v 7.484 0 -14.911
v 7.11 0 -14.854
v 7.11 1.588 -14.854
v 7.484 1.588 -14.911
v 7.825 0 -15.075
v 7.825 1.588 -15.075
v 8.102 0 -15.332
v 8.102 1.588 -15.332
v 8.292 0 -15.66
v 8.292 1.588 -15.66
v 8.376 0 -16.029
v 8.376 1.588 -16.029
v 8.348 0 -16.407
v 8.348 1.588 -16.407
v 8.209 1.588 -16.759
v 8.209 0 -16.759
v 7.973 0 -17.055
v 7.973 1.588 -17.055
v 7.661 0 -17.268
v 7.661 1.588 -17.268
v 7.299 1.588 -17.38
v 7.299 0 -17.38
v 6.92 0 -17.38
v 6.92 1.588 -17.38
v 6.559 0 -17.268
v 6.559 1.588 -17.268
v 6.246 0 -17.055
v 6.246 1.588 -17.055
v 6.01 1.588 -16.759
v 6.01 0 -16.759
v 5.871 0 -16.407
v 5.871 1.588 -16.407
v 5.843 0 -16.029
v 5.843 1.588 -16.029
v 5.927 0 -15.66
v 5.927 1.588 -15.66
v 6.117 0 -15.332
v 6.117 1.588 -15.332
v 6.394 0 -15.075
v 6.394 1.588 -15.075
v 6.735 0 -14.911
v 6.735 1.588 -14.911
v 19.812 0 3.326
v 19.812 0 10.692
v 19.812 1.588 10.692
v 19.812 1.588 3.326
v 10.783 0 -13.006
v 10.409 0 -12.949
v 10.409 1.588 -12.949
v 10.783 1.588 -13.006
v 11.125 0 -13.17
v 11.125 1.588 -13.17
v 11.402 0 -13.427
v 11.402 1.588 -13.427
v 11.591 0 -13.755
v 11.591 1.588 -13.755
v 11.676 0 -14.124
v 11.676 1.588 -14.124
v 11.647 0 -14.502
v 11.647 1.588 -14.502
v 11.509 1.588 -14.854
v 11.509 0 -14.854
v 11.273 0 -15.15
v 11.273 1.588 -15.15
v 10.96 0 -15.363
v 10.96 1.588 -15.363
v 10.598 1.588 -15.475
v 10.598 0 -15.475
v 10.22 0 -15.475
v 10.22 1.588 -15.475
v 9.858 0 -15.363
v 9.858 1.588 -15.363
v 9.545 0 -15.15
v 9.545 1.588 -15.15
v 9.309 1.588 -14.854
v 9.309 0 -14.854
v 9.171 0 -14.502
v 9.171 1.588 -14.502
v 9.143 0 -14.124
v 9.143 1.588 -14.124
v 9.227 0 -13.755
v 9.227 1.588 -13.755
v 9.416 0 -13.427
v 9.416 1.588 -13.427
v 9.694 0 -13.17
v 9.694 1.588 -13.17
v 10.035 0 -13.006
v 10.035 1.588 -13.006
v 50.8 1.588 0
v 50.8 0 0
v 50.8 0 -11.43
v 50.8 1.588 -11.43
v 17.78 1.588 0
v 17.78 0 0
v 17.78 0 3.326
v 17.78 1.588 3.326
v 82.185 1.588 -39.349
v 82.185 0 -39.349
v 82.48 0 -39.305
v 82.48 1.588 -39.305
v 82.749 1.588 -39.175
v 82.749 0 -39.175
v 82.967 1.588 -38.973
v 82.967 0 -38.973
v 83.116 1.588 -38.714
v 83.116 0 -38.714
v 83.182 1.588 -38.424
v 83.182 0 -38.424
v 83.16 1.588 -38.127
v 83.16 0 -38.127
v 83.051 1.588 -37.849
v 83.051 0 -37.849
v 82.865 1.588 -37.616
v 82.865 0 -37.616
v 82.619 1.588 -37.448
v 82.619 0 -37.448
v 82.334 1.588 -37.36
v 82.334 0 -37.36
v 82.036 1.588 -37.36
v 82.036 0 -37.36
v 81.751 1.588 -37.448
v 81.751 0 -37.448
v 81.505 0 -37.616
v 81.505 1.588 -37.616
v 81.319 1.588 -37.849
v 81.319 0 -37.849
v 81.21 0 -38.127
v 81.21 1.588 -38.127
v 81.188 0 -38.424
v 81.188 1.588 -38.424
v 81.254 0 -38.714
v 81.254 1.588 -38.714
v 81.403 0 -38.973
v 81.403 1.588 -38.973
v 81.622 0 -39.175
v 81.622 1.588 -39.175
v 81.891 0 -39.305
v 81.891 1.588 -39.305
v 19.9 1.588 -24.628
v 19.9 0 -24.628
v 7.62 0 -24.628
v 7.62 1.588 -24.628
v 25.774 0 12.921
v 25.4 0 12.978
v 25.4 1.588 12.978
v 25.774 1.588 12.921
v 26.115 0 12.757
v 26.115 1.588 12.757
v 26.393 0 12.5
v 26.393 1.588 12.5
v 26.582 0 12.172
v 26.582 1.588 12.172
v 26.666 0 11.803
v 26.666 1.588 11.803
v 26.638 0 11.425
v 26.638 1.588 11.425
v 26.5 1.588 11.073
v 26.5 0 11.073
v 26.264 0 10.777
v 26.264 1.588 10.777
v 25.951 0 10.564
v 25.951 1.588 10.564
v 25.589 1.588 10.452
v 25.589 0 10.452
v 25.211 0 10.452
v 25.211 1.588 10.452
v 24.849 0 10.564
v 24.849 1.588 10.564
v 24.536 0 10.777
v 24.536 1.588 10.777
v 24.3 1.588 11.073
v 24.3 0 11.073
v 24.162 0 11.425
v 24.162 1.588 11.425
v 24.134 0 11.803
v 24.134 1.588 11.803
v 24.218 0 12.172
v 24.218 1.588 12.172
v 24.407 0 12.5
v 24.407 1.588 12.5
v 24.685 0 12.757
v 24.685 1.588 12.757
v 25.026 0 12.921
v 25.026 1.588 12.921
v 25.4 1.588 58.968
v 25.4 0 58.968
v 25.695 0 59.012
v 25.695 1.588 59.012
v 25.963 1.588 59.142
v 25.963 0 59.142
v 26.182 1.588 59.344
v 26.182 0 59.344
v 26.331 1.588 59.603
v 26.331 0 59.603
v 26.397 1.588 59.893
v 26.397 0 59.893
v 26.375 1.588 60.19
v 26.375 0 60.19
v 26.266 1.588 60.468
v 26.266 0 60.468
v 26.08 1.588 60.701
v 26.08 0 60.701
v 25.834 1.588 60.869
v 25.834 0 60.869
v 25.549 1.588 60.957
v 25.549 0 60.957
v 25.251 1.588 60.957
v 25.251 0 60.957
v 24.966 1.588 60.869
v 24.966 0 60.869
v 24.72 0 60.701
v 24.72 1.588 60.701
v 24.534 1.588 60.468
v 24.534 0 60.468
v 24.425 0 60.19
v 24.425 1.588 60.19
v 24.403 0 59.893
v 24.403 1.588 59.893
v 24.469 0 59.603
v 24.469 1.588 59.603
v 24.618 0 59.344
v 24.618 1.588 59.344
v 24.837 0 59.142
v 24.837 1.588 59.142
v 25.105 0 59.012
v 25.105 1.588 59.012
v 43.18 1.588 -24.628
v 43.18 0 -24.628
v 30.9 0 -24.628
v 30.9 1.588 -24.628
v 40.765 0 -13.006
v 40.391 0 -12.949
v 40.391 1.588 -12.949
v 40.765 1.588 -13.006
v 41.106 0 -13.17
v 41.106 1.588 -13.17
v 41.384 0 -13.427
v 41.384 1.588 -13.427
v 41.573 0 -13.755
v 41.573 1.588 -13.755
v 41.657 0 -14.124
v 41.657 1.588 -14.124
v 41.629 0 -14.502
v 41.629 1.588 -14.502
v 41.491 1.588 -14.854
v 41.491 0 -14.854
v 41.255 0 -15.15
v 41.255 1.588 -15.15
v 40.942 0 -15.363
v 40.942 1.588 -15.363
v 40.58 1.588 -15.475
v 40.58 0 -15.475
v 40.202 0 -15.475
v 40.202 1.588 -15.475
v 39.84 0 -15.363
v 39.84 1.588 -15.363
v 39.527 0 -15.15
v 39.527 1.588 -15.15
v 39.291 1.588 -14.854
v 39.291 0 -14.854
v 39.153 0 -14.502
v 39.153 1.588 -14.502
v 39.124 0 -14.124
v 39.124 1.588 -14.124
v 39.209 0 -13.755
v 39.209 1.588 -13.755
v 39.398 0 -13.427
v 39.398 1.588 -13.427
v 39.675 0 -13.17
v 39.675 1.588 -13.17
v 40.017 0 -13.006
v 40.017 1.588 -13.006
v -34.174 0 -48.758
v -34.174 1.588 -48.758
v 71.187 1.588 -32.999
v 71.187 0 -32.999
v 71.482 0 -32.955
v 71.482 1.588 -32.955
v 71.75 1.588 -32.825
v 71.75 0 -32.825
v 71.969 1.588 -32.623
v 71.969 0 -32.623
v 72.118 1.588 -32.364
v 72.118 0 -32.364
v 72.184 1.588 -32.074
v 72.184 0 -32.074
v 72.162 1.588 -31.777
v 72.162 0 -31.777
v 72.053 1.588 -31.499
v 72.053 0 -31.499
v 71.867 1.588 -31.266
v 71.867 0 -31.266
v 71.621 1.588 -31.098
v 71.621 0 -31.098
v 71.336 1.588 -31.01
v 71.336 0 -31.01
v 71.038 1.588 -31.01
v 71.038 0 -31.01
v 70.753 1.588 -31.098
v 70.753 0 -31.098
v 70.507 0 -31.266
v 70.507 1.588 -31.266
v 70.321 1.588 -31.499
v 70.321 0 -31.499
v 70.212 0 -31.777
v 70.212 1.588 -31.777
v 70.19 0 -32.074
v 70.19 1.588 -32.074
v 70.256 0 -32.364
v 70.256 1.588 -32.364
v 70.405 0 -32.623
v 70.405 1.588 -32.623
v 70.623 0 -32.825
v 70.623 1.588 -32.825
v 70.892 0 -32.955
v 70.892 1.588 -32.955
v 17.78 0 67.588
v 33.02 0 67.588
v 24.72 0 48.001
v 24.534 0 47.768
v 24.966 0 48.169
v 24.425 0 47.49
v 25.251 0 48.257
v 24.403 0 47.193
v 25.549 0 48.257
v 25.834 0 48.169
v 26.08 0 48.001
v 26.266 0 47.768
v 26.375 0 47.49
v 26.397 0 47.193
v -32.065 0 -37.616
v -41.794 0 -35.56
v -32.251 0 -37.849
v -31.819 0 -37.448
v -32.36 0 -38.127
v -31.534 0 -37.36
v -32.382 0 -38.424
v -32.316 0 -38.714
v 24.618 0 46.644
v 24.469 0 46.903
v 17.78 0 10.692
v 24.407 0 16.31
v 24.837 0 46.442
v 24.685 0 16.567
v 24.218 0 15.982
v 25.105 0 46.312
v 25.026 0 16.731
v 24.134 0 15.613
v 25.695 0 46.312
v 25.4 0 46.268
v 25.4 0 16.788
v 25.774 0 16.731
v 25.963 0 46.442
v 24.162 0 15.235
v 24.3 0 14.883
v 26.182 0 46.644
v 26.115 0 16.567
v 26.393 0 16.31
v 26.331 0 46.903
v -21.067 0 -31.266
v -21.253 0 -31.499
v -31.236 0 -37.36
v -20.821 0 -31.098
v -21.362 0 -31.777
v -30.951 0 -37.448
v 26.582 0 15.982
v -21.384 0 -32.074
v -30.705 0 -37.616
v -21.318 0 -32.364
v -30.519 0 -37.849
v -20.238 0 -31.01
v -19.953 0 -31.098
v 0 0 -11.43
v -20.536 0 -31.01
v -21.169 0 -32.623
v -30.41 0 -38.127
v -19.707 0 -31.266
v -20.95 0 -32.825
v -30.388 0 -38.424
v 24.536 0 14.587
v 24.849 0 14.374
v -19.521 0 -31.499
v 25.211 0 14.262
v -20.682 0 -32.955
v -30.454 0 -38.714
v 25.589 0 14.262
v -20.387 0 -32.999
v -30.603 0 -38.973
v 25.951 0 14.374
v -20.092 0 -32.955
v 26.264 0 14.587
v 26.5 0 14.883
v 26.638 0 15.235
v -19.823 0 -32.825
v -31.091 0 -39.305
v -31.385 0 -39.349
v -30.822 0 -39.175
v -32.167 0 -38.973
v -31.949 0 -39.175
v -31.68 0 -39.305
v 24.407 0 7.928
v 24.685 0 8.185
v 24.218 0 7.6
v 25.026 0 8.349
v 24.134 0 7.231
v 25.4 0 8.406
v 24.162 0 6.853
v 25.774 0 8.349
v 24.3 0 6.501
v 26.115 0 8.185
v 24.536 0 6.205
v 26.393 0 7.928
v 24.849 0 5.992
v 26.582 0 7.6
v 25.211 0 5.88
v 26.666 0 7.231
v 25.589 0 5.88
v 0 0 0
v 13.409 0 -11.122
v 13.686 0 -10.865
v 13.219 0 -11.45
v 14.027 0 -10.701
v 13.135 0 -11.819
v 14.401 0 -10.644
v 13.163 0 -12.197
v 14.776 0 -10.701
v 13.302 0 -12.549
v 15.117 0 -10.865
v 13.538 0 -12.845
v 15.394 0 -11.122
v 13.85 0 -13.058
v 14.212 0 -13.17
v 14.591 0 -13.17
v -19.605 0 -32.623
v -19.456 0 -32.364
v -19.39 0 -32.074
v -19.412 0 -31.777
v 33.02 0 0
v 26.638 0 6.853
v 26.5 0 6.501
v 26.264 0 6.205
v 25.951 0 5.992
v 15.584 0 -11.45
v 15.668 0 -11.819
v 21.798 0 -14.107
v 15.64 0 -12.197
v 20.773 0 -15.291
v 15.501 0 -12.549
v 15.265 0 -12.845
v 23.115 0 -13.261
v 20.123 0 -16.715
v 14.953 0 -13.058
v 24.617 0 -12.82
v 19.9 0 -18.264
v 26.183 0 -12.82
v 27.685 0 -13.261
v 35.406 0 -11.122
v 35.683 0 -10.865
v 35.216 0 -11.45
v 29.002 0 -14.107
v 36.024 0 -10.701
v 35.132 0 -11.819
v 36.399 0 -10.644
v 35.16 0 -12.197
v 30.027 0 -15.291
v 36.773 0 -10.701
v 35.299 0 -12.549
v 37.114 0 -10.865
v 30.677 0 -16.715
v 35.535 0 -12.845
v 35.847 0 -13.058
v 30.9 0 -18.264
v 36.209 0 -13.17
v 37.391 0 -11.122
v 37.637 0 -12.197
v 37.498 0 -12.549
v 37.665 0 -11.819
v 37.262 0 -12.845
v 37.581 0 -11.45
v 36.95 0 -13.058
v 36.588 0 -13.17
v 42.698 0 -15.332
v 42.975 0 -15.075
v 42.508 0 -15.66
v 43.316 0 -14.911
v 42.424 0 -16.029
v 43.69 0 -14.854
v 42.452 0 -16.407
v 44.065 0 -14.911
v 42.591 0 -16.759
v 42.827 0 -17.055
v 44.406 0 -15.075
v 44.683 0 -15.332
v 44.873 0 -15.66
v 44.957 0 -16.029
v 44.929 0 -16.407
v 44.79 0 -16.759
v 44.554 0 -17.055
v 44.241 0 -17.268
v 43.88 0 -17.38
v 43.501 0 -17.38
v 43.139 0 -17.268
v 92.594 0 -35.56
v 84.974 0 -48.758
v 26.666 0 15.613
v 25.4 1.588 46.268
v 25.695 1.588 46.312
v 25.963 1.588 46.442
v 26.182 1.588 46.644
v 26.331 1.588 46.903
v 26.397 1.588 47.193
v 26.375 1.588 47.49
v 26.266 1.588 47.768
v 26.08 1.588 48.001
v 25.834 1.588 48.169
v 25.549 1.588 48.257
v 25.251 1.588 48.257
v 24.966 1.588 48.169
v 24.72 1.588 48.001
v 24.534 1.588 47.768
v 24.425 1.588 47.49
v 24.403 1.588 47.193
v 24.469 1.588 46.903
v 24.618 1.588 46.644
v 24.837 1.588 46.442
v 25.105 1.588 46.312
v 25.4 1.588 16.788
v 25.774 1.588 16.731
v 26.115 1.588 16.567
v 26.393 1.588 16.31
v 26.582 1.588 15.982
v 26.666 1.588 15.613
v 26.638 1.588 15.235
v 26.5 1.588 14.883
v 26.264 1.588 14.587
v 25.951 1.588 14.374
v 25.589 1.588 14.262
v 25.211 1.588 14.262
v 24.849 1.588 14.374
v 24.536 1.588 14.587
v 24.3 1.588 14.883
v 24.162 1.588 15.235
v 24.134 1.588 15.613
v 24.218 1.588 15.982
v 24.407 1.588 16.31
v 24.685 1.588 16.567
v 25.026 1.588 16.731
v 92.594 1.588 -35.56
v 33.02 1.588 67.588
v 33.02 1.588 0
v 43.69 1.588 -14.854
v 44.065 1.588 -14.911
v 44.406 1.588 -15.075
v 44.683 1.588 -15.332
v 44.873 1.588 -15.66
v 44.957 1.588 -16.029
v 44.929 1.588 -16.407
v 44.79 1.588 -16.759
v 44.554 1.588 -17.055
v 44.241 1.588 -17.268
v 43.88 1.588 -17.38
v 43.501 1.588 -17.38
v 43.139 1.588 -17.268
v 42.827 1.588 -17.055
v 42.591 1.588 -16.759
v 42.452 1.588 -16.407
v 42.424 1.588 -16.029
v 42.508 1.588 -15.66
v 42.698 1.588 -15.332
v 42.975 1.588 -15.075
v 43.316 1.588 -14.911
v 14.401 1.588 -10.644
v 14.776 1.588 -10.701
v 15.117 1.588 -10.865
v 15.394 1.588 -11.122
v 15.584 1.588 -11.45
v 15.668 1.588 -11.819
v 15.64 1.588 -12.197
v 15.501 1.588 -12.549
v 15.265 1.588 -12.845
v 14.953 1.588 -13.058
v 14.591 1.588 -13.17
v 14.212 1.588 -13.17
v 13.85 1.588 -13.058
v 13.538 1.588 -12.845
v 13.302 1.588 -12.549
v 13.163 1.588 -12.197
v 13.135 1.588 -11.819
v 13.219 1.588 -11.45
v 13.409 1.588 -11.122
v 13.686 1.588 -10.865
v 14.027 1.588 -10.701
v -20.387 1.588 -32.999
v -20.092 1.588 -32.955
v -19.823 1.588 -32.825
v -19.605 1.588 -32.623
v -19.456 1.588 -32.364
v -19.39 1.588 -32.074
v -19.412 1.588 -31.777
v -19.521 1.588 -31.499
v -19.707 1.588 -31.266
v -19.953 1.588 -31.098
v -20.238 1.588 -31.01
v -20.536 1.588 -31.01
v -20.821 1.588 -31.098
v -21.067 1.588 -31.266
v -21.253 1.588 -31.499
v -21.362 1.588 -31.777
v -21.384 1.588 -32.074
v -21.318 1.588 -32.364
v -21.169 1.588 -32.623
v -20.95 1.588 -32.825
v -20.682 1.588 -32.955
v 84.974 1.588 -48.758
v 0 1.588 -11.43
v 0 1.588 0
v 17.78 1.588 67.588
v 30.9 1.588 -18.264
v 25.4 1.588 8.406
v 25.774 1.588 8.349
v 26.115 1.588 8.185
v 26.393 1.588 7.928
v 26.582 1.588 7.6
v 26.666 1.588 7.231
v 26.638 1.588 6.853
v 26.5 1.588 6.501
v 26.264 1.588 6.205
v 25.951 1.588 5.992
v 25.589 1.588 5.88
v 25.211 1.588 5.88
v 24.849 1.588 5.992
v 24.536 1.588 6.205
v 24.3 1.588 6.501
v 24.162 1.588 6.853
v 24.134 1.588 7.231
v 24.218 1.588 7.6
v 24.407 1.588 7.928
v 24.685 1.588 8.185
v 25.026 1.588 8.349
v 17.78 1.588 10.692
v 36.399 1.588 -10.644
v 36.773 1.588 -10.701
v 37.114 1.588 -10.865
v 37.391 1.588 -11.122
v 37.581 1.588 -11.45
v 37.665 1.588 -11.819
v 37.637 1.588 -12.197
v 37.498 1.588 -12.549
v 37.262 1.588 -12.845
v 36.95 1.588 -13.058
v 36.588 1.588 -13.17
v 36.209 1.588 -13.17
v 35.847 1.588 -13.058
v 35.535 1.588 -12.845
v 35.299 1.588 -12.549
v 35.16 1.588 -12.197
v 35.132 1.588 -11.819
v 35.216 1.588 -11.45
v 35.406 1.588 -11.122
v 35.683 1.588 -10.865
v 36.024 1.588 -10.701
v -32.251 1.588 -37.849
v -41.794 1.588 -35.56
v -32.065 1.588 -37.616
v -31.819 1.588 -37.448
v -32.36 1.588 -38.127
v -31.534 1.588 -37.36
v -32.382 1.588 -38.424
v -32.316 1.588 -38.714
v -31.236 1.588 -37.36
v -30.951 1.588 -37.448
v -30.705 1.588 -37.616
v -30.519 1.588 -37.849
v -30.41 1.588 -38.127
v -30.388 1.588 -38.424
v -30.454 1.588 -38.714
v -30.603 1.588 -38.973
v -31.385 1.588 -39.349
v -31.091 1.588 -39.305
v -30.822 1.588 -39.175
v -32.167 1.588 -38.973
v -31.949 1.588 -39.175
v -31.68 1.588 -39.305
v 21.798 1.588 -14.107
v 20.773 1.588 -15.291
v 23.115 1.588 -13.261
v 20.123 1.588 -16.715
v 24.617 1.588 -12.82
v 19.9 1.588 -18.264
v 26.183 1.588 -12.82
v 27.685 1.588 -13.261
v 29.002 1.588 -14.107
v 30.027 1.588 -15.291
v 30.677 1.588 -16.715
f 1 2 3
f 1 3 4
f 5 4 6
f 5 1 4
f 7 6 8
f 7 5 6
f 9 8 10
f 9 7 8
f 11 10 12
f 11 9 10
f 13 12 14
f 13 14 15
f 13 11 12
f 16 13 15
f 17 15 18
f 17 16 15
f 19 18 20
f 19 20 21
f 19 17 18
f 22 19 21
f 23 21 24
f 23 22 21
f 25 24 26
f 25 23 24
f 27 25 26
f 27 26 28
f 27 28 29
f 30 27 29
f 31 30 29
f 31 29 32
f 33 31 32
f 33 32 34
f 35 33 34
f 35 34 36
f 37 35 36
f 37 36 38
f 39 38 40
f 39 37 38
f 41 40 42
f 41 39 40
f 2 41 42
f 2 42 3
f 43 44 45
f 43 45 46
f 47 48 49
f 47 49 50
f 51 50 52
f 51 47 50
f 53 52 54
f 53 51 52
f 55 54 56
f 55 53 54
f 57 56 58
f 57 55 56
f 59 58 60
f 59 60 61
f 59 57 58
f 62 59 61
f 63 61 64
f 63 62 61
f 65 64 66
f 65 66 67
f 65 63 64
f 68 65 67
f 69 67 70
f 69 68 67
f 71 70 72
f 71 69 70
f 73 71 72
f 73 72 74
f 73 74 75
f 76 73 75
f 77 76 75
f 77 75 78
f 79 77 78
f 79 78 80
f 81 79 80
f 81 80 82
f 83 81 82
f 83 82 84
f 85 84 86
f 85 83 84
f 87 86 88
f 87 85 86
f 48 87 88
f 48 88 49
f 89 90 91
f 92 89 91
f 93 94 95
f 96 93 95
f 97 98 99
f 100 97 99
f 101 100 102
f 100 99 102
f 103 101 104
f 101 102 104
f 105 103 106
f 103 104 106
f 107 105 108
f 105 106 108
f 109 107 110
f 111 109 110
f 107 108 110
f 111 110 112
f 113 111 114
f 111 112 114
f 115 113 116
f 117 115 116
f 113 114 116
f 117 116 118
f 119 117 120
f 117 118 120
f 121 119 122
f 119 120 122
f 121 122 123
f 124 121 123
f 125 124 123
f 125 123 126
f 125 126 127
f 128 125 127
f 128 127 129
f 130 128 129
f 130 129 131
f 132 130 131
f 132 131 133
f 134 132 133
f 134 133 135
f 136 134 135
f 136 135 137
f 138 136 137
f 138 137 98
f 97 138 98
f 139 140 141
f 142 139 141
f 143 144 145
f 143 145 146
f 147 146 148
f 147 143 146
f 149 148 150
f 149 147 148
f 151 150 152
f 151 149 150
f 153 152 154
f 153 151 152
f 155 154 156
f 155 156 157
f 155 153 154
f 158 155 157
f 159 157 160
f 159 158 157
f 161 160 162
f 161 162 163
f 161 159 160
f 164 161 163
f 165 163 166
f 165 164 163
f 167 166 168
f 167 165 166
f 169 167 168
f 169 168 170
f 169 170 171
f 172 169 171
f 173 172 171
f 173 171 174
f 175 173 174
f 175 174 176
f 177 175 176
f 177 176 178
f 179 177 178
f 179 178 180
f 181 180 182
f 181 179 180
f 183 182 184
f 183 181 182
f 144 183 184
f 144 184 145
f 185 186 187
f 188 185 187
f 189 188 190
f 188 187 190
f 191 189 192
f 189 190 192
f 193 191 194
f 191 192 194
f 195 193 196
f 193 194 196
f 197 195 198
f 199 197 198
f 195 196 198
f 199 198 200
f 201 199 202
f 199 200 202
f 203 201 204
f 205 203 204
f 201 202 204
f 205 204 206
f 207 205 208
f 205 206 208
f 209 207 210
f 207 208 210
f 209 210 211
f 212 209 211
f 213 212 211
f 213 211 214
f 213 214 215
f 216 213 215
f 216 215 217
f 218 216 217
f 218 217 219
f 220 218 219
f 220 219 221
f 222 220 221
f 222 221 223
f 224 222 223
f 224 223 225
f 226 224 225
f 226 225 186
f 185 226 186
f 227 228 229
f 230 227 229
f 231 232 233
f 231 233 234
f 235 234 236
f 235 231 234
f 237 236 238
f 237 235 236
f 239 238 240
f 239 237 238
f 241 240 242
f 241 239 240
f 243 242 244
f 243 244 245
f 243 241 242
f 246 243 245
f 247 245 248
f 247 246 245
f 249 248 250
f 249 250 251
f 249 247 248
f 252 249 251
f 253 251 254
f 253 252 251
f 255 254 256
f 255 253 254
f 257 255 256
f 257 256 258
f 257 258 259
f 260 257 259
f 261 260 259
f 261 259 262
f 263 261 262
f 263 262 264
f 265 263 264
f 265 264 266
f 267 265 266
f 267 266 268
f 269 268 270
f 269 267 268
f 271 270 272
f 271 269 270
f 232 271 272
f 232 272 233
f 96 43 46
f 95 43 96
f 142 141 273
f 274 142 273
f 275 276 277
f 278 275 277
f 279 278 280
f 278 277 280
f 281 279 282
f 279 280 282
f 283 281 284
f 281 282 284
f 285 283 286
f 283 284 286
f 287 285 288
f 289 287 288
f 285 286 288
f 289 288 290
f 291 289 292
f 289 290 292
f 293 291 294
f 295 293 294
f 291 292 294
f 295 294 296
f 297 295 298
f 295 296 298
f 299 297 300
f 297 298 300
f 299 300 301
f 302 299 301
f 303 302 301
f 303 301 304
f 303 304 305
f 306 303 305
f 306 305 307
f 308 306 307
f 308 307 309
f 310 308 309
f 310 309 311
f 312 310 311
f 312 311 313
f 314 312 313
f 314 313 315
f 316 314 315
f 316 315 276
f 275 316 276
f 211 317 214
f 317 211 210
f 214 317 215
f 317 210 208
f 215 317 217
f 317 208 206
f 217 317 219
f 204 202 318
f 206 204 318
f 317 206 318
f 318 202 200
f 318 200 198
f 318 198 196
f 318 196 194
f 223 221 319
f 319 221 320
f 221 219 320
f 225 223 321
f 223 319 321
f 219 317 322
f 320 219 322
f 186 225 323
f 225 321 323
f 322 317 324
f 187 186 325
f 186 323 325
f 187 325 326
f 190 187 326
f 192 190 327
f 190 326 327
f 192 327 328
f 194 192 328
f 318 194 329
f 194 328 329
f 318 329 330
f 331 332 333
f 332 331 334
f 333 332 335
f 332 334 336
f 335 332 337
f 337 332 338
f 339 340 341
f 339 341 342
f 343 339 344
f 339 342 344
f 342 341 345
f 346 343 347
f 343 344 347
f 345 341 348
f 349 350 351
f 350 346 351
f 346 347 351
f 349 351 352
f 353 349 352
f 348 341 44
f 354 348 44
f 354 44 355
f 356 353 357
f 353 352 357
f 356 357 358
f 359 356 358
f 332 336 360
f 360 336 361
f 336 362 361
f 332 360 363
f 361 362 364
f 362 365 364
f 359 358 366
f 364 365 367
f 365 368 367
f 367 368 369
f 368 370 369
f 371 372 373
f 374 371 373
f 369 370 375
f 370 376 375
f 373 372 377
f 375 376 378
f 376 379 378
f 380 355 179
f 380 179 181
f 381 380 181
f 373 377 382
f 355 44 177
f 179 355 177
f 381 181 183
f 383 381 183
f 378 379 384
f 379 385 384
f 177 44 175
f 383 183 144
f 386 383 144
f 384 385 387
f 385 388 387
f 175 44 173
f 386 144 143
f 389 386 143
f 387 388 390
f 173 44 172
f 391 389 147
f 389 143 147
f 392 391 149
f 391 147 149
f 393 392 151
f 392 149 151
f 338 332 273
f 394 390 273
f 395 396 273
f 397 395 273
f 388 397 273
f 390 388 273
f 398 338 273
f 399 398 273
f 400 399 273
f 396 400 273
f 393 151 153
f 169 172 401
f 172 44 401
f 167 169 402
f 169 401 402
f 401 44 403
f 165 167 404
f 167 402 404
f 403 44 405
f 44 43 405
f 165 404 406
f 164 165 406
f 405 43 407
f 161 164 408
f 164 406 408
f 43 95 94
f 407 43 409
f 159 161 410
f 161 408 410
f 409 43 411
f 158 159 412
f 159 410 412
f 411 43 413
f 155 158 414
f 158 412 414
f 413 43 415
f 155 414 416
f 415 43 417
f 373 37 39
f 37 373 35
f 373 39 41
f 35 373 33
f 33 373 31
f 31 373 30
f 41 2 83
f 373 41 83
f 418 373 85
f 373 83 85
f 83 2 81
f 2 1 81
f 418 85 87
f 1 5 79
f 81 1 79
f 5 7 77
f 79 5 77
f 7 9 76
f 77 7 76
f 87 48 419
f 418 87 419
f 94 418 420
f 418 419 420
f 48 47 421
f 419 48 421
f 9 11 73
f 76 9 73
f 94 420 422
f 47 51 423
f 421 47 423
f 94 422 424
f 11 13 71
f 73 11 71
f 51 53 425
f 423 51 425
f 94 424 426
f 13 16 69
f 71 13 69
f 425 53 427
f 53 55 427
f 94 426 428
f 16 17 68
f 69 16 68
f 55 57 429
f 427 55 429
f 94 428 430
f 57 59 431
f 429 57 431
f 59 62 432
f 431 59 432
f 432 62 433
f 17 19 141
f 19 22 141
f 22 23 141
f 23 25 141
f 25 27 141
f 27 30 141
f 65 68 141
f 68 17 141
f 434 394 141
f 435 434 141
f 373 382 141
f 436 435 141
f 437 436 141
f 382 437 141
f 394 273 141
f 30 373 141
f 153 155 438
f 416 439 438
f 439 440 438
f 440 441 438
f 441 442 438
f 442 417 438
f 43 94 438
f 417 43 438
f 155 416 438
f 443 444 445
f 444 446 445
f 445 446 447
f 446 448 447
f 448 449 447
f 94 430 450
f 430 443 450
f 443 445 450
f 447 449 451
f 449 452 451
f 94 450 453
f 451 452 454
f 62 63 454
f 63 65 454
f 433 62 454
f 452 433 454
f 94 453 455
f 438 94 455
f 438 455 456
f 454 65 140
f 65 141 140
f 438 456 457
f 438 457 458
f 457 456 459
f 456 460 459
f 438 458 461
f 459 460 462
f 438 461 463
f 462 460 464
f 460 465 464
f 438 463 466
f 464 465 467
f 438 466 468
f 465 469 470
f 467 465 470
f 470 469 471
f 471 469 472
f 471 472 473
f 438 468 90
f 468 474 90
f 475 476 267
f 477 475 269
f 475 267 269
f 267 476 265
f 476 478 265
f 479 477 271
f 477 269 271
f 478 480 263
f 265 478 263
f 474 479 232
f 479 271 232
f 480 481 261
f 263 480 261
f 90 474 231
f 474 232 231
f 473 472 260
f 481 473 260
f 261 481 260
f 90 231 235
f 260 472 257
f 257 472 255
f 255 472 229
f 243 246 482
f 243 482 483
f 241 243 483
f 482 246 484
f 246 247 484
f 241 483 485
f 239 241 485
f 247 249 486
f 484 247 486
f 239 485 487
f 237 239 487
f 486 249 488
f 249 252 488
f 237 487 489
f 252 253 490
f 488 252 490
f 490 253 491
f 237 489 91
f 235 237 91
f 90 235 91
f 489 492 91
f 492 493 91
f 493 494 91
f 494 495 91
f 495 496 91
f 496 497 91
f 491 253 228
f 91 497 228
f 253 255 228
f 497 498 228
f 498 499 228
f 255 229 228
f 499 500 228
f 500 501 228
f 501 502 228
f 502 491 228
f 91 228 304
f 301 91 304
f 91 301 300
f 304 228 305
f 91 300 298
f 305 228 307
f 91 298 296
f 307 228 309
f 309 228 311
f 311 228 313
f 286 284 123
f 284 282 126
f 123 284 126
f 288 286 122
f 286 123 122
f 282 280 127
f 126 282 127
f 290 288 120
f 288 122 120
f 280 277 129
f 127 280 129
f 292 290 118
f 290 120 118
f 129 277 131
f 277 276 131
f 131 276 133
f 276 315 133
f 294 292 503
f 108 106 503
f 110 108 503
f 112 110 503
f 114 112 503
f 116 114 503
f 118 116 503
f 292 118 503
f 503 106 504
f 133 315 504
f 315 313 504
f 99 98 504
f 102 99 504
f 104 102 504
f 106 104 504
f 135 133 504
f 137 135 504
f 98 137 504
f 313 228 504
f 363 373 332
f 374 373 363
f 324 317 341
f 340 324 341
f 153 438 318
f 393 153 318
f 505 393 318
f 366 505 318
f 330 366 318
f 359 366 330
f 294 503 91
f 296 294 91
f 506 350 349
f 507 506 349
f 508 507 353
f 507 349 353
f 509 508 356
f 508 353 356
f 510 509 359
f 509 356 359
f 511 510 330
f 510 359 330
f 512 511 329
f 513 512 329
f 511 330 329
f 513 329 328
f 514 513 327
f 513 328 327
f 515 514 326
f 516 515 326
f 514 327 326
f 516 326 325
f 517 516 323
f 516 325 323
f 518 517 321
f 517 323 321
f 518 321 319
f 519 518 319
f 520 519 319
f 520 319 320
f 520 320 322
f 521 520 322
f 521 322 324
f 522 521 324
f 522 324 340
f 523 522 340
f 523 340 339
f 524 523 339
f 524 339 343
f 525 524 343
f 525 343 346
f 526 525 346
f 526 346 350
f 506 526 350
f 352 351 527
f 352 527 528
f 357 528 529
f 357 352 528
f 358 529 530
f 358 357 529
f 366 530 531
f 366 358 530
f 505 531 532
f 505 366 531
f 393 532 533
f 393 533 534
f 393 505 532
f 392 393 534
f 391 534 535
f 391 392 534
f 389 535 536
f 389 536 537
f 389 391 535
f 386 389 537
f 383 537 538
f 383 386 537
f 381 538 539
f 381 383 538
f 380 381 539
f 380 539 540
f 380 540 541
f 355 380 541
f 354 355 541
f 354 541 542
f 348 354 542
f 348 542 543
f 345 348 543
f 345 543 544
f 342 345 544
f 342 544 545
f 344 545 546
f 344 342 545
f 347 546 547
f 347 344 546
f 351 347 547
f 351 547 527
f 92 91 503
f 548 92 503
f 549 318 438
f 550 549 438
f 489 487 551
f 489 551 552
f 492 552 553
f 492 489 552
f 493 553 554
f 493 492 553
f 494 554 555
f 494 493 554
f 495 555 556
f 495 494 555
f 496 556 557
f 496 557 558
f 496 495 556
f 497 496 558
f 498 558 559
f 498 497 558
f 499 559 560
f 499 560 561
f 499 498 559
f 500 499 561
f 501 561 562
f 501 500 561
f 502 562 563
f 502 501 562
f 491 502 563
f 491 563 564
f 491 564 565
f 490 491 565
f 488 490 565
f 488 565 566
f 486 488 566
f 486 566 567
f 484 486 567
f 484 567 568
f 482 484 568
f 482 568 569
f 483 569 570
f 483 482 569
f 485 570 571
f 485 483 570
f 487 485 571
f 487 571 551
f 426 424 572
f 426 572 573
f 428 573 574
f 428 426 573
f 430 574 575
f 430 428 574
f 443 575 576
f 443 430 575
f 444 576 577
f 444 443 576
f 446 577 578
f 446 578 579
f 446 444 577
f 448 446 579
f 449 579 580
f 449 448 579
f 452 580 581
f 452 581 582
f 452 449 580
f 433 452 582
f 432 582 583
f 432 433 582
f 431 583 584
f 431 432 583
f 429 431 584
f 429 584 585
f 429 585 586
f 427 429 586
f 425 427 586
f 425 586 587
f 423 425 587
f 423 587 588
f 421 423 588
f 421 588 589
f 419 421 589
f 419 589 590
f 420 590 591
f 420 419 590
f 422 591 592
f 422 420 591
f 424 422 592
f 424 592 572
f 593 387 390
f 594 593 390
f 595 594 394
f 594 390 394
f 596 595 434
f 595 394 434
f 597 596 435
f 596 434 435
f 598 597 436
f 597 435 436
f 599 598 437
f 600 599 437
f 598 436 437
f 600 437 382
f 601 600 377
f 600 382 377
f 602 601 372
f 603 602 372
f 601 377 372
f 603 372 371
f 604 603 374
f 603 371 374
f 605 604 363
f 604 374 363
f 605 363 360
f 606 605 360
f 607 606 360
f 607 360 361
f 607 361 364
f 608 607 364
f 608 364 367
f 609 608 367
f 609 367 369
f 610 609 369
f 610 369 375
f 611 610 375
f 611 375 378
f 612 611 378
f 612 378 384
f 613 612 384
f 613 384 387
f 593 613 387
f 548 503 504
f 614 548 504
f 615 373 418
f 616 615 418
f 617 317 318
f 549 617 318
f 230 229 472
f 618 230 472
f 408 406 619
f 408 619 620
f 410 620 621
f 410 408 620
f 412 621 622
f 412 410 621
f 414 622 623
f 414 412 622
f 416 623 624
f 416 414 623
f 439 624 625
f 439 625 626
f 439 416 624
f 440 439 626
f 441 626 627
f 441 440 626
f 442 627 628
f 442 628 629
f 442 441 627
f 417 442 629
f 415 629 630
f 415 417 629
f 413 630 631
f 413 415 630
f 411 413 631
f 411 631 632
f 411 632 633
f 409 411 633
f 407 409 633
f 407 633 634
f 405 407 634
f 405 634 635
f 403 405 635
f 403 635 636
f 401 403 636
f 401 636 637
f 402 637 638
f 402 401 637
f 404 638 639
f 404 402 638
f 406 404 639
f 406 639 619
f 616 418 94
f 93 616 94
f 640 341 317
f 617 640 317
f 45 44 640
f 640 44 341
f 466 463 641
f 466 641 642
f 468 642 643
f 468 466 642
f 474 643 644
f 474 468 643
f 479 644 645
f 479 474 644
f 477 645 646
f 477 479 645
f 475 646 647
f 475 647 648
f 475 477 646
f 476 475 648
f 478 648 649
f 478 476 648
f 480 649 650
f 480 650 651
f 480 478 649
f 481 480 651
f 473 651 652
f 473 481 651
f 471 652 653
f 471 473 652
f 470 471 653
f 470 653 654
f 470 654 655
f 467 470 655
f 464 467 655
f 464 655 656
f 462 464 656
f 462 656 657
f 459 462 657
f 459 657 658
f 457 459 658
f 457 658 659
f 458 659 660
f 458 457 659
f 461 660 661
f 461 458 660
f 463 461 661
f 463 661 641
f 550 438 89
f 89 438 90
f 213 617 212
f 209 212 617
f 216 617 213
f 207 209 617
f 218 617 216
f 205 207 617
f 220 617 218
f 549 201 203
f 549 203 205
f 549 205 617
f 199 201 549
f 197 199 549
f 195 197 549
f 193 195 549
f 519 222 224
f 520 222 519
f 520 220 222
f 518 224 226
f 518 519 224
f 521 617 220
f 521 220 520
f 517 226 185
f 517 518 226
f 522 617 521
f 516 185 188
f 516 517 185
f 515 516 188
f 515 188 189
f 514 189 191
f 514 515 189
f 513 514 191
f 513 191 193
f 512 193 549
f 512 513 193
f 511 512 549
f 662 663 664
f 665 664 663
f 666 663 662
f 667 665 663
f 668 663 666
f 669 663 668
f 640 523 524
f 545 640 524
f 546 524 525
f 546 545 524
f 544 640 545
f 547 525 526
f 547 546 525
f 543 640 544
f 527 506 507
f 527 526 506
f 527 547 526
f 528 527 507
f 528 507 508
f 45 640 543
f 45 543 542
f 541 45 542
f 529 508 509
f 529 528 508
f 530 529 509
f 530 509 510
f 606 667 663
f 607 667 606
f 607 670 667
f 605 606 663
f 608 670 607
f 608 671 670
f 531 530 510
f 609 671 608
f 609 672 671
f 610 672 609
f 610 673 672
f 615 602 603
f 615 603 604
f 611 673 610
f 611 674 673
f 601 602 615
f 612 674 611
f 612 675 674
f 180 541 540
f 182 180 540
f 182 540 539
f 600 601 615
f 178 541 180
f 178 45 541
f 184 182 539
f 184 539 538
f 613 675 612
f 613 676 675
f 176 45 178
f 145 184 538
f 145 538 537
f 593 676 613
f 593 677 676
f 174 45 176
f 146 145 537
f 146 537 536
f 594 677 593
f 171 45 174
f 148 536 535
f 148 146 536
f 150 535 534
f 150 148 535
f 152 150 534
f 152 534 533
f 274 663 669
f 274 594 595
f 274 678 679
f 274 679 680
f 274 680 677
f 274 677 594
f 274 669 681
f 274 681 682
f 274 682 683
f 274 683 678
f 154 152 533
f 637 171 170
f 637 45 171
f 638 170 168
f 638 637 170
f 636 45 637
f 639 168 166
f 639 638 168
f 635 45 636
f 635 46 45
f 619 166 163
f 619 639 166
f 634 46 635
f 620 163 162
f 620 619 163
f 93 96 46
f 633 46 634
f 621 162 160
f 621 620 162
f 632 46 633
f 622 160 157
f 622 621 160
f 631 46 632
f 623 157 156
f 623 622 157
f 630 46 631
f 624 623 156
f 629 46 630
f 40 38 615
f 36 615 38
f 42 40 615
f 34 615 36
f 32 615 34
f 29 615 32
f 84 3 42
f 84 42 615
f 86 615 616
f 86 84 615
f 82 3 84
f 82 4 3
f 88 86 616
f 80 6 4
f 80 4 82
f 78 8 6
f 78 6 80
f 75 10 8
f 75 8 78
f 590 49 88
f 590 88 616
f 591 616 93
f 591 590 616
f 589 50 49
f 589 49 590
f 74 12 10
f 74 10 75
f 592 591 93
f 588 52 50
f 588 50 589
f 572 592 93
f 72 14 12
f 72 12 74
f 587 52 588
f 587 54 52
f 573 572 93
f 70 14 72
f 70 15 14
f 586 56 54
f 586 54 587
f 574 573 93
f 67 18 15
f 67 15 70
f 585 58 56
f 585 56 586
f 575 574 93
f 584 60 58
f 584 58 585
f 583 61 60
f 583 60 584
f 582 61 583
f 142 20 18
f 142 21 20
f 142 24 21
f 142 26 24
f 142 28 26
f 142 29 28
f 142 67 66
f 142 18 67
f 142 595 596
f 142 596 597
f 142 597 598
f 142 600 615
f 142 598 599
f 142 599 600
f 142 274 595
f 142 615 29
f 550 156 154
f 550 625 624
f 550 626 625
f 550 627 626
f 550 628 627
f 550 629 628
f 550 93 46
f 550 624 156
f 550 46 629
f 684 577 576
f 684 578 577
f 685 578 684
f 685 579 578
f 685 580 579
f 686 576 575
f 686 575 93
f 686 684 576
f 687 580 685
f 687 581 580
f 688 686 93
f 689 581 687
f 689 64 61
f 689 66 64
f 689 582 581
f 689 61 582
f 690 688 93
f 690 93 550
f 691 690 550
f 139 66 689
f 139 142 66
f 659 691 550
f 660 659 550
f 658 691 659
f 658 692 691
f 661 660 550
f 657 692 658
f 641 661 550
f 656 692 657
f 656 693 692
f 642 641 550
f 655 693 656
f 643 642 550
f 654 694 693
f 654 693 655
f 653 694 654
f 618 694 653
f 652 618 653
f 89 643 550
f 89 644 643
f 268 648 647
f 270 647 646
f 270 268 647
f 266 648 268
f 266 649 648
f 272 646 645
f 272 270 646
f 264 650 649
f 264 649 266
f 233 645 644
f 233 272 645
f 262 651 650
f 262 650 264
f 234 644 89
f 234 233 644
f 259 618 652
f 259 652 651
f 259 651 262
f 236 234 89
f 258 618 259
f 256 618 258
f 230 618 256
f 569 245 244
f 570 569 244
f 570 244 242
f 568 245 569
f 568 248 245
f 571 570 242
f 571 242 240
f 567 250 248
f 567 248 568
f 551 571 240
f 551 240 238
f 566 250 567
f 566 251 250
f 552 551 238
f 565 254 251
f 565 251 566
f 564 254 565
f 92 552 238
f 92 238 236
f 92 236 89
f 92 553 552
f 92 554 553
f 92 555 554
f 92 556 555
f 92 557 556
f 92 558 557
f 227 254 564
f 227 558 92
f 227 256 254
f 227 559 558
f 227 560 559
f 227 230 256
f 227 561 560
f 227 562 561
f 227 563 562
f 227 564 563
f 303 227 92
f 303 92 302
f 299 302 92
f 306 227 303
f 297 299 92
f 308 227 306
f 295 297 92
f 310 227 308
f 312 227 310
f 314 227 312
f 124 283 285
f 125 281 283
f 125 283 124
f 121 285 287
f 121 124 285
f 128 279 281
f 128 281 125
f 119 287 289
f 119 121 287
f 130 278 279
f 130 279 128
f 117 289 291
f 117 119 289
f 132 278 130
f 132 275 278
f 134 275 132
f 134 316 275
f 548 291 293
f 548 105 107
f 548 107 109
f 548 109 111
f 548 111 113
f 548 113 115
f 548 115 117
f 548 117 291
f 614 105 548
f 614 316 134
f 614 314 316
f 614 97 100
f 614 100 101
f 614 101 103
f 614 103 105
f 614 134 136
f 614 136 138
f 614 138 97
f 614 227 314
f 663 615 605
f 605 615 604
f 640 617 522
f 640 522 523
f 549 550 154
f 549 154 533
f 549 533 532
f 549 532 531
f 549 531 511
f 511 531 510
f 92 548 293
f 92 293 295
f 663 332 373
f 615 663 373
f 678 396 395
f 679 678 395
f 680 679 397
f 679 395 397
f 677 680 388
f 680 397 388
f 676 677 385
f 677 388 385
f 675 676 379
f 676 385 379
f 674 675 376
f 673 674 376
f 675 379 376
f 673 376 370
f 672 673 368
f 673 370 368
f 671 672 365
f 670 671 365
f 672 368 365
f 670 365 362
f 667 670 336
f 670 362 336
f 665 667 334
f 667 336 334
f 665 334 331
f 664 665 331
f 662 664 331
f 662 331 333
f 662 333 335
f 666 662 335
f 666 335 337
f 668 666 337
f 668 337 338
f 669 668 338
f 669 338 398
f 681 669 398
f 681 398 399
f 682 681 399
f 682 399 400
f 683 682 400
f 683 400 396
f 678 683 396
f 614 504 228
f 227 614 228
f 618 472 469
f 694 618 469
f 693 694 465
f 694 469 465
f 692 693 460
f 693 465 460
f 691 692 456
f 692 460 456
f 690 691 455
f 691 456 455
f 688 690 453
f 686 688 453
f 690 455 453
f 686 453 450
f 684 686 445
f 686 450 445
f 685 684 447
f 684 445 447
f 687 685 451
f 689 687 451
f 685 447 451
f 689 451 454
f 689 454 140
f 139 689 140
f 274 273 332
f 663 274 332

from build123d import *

# Parameters (mm, degrees)
SKETCH1_R           = 1.27
BOSS_EXTRUDE2_DEPTH = 1.5875
SKETCH6_W           = 2.032
SKETCH6_H           = 7.366
CUT_EXTRUDE4_DEPTH  = 2.54
SKETCH7_R           = 1
CUT_EXTRUDE5_DEPTH  = 2.54


with BuildPart() as part:
    # Sketch1 → Boss-Extrude2 (new body)
    with BuildSketch(Plane(origin=(0, 0, 0), x_dir=(1, 0, 0), z_dir=(0, 1, 0))):
        with BuildLine():
            Line((-41.794385987, 35.56), (0, 11.43))
            Line((0, 11.43), (0, 0))
            Line((0, 0), (17.78, 0))
            Line((17.78, 0), (17.78, -67.587878735))
            Line((17.78, -67.587878735), (33.02, -67.587878735))
            Line((33.02, -67.587878735), (33.02, 0))
            Line((33.02, 0), (50.8, 0))
            Line((50.8, 0), (50.8, 11.43))
            Line((50.8, 11.43), (92.594385987, 35.56))
            Line((92.594385987, 35.56), (84.974385987, 48.758227154))
            Line((84.974385987, 48.758227154), (43.18, 24.628227154))
            Line((43.18, 24.628227154), (30.9, 24.628227154))
            Line((30.9, 24.628227154), (30.9, 18.264121265))
            ThreePointArc((30.9, 18.264121265), (25.4, 12.764121265), (19.9, 18.264121265))
            Line((19.9, 18.264121265), (19.9, 24.628227154))
            Line((19.9, 24.628227154), (7.62, 24.628227154))
            Line((7.62, 24.628227154), (-34.174385987, 48.758227154))
            Line((-34.174385987, 48.758227154), (-41.794385987, 35.56))
        make_face()
        with Locations(Location((43.690443212, 16.124113577, 0), (0, 0, 270))):
            Circle(SKETCH1_R, mode=Mode.SUBTRACT)
        with Locations(Location((36.398522628, 11.914121265, 0), (0, 0, 270))):
            Circle(SKETCH1_R, mode=Mode.SUBTRACT)
        with Locations(Location((14.401477372, 11.914121265, 0), (0, 0, 270))):
            Circle(SKETCH1_R, mode=Mode.SUBTRACT)
        with Locations(Location((7.109556788, 16.124113577, 0), (0, 0, 270))):
            Circle(SKETCH1_R, mode=Mode.SUBTRACT)
        with Locations(Location((10.409113577, 14.219113577, 0), (0, 0, 270))):
            Circle(SKETCH1_R, mode=Mode.SUBTRACT)
        with Locations(Location((40.390886423, 14.219113577, 0), (0, 0, 270))):
            Circle(SKETCH1_R, mode=Mode.SUBTRACT)
        with Locations(Location((25.4, -7.135878735, 0), (0, 0, 270))):
            Circle(SKETCH1_R, mode=Mode.SUBTRACT)
        with Locations(Location((25.4, -15.517878735, 0), (0, 0, 270))):
            Circle(SKETCH1_R, mode=Mode.SUBTRACT)
        with Locations(Location((25.4, -11.707878735, 0), (0, 0, 270))):
            Circle(SKETCH1_R, mode=Mode.SUBTRACT)
    extrude(amount=BOSS_EXTRUDE2_DEPTH)

    # Sketch6 → Cut-Extrude4 (cut)
    with BuildSketch(Plane(origin=(0, 0, 0), x_dir=(-1, 0, 0), z_dir=(0, -1, 0))):
        with Locations((-18.796, -7.008878735)):
            Rectangle(SKETCH6_W, SKETCH6_H)
    extrude(amount=-CUT_EXTRUDE4_DEPTH, mode=Mode.SUBTRACT)

    # Sketch7 → Cut-Extrude5 (cut)
    with BuildSketch(Plane(origin=(0, 0, 0), x_dir=(-1, 0, 0), z_dir=(0, -1, 0))):
        with Locations(Location((-25.4, -59.967878735, 0), (0, 0, 90))):
            Circle(SKETCH7_R)
        with Locations(Location((-25.4, -47.267878735, 0), (0, 0, 90))):
            Circle(SKETCH7_R)
        with Locations(Location((-71.186749782, 31.999113577, 0), (0, 0, 90))):
            Circle(SKETCH7_R)
        with Locations(Location((-82.18527241, 38.349113577, 0), (0, 0, 90))):
            Circle(SKETCH7_R)
        with Locations(Location((31.38527241, 38.349113577, 0), (0, 0, 90))):
            Circle(SKETCH7_R)
        with Locations(Location((20.386749782, 31.999113577, 0), (0, 0, 90))):
            Circle(SKETCH7_R)
    extrude(amount=-CUT_EXTRUDE5_DEPTH, mode=Mode.SUBTRACT)


solid = part.part
